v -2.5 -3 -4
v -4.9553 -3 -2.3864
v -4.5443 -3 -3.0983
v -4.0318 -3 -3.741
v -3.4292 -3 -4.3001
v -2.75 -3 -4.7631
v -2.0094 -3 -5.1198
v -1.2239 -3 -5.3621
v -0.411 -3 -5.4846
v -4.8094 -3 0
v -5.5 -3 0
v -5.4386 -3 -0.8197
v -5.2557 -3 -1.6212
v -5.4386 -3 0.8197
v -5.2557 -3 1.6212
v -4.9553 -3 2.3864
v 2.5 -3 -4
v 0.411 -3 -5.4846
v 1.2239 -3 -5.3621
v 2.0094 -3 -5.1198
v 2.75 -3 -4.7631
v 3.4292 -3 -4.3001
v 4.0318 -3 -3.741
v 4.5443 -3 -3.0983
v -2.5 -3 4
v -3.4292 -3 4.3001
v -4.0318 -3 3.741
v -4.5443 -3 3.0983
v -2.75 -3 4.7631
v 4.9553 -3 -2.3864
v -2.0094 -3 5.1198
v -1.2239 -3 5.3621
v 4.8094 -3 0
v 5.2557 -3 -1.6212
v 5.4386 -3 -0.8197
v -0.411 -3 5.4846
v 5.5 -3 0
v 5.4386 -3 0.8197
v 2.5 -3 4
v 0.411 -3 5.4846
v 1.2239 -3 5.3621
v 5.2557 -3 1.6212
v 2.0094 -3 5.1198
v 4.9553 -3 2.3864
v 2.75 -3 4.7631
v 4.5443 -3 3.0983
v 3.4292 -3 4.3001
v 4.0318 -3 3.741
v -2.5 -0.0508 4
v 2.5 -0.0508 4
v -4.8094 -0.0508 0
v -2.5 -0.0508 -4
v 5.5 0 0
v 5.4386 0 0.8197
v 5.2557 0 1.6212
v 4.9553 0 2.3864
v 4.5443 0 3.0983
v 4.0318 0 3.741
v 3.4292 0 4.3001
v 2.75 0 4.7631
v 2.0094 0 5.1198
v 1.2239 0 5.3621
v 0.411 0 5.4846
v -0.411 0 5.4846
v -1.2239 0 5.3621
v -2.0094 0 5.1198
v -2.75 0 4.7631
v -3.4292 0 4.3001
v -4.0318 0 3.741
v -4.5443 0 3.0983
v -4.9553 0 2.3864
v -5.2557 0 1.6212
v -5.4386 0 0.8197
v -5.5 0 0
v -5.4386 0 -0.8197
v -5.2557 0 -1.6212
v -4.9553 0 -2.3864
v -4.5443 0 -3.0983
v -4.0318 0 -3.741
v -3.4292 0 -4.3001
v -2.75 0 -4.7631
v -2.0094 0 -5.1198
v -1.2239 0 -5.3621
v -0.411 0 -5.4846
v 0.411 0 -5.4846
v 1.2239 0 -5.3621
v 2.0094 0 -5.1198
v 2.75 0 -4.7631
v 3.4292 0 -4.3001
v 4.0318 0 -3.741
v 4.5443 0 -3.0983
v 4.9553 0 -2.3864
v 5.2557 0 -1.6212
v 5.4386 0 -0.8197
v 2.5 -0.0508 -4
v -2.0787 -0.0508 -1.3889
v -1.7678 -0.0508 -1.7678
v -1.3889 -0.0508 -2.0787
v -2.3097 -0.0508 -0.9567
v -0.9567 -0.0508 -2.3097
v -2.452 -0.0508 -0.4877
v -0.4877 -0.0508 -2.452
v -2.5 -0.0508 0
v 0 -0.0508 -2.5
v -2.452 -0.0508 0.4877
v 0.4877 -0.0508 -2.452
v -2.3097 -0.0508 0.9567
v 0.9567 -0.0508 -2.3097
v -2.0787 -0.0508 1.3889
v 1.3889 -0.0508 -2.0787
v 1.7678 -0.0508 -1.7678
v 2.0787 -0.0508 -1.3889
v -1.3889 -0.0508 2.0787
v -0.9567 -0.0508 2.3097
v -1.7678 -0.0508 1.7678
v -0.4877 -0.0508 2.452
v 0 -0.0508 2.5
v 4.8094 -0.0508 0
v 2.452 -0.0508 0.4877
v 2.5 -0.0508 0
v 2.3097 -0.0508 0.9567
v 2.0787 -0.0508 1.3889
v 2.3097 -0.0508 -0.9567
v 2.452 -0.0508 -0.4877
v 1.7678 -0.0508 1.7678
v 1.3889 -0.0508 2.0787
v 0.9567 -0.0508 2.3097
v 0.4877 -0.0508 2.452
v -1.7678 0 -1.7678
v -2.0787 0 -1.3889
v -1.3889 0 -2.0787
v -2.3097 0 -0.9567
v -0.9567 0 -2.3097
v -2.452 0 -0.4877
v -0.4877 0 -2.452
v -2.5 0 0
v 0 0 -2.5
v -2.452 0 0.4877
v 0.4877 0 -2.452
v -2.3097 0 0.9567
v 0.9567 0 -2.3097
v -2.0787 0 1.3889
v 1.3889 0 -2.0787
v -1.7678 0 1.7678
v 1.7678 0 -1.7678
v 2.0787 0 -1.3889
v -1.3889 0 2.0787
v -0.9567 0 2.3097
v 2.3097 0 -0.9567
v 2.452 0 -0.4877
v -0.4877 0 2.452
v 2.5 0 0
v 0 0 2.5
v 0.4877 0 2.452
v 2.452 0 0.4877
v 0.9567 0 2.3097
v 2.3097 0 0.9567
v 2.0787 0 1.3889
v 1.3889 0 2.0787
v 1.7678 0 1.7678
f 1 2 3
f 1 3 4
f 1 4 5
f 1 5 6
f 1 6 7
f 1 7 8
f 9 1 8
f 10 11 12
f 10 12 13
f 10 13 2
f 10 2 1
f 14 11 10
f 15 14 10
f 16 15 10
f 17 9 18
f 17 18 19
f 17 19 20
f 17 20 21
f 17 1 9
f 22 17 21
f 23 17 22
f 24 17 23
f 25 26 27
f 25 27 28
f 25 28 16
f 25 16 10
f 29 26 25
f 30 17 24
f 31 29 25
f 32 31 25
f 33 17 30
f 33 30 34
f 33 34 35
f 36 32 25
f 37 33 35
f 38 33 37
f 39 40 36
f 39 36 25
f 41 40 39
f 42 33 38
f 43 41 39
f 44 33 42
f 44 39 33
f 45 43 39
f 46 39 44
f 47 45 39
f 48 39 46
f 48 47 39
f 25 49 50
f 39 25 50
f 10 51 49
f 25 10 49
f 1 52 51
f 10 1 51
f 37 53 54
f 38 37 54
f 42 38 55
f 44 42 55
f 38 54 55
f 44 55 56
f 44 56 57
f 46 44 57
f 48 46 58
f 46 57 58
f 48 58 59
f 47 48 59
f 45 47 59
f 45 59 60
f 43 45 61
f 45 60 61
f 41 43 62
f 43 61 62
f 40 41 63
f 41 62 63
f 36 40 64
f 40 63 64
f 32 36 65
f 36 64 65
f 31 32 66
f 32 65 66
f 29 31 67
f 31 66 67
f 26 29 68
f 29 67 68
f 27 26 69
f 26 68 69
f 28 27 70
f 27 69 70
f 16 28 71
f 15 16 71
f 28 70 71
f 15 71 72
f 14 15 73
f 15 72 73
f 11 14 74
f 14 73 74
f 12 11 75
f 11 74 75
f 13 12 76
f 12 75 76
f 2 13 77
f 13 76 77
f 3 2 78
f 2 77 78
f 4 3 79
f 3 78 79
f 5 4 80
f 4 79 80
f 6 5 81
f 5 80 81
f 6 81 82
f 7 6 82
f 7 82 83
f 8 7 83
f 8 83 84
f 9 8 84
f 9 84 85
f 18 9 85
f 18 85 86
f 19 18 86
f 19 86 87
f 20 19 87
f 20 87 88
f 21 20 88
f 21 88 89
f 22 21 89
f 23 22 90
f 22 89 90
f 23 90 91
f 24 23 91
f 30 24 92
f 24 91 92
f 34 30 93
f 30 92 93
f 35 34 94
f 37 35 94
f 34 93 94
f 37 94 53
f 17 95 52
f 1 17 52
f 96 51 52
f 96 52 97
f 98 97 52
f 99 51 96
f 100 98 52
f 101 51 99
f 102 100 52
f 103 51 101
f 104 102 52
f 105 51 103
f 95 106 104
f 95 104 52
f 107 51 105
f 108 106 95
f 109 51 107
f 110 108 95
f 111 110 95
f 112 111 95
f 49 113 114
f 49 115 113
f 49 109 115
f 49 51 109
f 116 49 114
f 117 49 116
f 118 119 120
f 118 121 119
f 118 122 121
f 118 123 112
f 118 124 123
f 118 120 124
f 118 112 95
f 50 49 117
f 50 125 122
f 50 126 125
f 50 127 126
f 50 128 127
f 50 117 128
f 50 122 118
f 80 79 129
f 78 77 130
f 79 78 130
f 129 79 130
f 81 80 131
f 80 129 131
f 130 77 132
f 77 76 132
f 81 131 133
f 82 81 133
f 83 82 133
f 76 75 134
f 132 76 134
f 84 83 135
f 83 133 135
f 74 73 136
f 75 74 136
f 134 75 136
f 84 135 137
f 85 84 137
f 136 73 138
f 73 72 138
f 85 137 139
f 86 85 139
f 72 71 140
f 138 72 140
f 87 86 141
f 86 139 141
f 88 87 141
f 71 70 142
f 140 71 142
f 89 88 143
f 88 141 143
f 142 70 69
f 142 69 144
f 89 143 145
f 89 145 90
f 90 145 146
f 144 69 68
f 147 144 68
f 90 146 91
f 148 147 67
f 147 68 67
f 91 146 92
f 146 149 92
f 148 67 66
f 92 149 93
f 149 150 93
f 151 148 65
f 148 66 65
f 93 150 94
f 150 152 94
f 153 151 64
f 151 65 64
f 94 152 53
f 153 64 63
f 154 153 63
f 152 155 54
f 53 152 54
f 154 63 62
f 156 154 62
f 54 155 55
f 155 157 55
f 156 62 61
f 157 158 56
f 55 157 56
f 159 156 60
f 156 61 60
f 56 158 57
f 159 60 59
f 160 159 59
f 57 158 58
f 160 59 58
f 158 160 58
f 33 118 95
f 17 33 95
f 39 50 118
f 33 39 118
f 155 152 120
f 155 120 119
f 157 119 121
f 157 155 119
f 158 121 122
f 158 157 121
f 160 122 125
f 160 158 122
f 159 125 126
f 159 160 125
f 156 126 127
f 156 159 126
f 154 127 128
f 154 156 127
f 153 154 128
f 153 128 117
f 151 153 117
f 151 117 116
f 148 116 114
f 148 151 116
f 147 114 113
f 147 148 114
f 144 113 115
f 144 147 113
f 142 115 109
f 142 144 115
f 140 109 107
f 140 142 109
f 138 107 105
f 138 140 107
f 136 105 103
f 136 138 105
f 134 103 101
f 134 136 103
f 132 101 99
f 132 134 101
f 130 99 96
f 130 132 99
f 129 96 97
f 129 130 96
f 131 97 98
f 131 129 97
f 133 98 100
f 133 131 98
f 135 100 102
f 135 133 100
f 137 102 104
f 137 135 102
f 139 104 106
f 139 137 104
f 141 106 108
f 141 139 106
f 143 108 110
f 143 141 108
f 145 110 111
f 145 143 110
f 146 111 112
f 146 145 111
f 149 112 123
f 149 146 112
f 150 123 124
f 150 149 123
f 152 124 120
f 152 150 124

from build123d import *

# Parameters (mm, degrees)
F0_R     = 5.5000017
F1_DEPTH = 2.999994
F2_R     = 2.499995
F2_W     = 0.7533299053
F2_H     = 0.7162170781
F2_W_2   = 0.5293672881
F2_H_2   = 0.5760601295
F2_W_3   = 0.6473100061
F2_H_3   = 0.7012212299
F2_W_4   = 0.3967036741
F2_H_4   = 0.5668902525
F2_W_5   = 0.5837015153
F2_H_5   = 1.7340490769
F2_W_6   = 0.5672975831
F2_H_6   = 1.9103930295
F3_DEPTH = 0.0508


with BuildPart() as f1:
    # F0 (on Front) → F1 (new body)
    with BuildSketch(Plane.XZ):
        Circle(F0_R)
        Polygon((2.499995, -4.0000047), (-2.499995, -4.0000047), (-4.8093987903, 0), (-2.499995, 4.0000047), (2.499995, 4.0000047), (4.8093987903, 0), align=None, mode=Mode.SUBTRACT)
    extrude(amount=F1_DEPTH)

    # F2 (on Front) → F3 (join)
    with BuildSketch(Plane.XZ):
        Polygon((-3.3830750486, -2.5726628955), (-3.3830750486, -4.0979331759), (3.3830750486, -4.0979331759), (3.3830750486, -2.7493634261), (3.3830750486, -2.1733032967), (3.3830750486, 2.3381632997), (3.3830750486, 2.9050535522), (3.3830750486, 4.0979331759), (-3.3830750486, 4.0979331759), (-3.3830750486, 2.7106830385), (-3.3830750486, 2.0094618085), (-3.3830750486, -1.8564458175), align=None)
        Circle(F2_R, mode=Mode.SUBTRACT)
        with Locations((-3.7597400012, -2.2145543565)):
            Rectangle(F2_W, F2_H)
        with Locations((3.6477586926, -2.4613333614)):
            Rectangle(F2_W_2, F2_H_2)
        Polygon((-4.1364049539, -1.8564458175), (-3.3830750486, -1.8564458175), (-3.3830750486, 2.0094618085), (-4.0303850546, 2.0094618085), (-4.5122085367, 2.0094618085), (-4.5122085367, 0.8686301033), (-4.5122085367, -0.8654189736), (-4.5122085367, -1.8564458175), align=None)
        Polygon((3.3830750486, 2.3381632997), (3.3830750486, -2.1733032967), (3.9124423367, -2.1733032967), (4.4418096248, -2.1733032967), (4.4418096248, -0.8654189736), (4.4418096248, 1.0449740559), (4.4418096248, 2.3381632997), (3.7797787227, 2.3381632997), align=None)
        with Locations((-3.7067300516, 2.3600724235)):
            Rectangle(F2_W_3, F2_H_3)
        with Locations((3.5814268856, 2.621608426)):
            Rectangle(F2_W_4, F2_H_4)
        with Locations((-4.8040592943, 0.0016055649)):
            Rectangle(F2_W_5, F2_H_5)
        with Locations((4.7254584164, 0.0897775412)):
            Rectangle(F2_W_6, F2_H_6)
    extrude(amount=F3_DEPTH)


solid = f1.part
